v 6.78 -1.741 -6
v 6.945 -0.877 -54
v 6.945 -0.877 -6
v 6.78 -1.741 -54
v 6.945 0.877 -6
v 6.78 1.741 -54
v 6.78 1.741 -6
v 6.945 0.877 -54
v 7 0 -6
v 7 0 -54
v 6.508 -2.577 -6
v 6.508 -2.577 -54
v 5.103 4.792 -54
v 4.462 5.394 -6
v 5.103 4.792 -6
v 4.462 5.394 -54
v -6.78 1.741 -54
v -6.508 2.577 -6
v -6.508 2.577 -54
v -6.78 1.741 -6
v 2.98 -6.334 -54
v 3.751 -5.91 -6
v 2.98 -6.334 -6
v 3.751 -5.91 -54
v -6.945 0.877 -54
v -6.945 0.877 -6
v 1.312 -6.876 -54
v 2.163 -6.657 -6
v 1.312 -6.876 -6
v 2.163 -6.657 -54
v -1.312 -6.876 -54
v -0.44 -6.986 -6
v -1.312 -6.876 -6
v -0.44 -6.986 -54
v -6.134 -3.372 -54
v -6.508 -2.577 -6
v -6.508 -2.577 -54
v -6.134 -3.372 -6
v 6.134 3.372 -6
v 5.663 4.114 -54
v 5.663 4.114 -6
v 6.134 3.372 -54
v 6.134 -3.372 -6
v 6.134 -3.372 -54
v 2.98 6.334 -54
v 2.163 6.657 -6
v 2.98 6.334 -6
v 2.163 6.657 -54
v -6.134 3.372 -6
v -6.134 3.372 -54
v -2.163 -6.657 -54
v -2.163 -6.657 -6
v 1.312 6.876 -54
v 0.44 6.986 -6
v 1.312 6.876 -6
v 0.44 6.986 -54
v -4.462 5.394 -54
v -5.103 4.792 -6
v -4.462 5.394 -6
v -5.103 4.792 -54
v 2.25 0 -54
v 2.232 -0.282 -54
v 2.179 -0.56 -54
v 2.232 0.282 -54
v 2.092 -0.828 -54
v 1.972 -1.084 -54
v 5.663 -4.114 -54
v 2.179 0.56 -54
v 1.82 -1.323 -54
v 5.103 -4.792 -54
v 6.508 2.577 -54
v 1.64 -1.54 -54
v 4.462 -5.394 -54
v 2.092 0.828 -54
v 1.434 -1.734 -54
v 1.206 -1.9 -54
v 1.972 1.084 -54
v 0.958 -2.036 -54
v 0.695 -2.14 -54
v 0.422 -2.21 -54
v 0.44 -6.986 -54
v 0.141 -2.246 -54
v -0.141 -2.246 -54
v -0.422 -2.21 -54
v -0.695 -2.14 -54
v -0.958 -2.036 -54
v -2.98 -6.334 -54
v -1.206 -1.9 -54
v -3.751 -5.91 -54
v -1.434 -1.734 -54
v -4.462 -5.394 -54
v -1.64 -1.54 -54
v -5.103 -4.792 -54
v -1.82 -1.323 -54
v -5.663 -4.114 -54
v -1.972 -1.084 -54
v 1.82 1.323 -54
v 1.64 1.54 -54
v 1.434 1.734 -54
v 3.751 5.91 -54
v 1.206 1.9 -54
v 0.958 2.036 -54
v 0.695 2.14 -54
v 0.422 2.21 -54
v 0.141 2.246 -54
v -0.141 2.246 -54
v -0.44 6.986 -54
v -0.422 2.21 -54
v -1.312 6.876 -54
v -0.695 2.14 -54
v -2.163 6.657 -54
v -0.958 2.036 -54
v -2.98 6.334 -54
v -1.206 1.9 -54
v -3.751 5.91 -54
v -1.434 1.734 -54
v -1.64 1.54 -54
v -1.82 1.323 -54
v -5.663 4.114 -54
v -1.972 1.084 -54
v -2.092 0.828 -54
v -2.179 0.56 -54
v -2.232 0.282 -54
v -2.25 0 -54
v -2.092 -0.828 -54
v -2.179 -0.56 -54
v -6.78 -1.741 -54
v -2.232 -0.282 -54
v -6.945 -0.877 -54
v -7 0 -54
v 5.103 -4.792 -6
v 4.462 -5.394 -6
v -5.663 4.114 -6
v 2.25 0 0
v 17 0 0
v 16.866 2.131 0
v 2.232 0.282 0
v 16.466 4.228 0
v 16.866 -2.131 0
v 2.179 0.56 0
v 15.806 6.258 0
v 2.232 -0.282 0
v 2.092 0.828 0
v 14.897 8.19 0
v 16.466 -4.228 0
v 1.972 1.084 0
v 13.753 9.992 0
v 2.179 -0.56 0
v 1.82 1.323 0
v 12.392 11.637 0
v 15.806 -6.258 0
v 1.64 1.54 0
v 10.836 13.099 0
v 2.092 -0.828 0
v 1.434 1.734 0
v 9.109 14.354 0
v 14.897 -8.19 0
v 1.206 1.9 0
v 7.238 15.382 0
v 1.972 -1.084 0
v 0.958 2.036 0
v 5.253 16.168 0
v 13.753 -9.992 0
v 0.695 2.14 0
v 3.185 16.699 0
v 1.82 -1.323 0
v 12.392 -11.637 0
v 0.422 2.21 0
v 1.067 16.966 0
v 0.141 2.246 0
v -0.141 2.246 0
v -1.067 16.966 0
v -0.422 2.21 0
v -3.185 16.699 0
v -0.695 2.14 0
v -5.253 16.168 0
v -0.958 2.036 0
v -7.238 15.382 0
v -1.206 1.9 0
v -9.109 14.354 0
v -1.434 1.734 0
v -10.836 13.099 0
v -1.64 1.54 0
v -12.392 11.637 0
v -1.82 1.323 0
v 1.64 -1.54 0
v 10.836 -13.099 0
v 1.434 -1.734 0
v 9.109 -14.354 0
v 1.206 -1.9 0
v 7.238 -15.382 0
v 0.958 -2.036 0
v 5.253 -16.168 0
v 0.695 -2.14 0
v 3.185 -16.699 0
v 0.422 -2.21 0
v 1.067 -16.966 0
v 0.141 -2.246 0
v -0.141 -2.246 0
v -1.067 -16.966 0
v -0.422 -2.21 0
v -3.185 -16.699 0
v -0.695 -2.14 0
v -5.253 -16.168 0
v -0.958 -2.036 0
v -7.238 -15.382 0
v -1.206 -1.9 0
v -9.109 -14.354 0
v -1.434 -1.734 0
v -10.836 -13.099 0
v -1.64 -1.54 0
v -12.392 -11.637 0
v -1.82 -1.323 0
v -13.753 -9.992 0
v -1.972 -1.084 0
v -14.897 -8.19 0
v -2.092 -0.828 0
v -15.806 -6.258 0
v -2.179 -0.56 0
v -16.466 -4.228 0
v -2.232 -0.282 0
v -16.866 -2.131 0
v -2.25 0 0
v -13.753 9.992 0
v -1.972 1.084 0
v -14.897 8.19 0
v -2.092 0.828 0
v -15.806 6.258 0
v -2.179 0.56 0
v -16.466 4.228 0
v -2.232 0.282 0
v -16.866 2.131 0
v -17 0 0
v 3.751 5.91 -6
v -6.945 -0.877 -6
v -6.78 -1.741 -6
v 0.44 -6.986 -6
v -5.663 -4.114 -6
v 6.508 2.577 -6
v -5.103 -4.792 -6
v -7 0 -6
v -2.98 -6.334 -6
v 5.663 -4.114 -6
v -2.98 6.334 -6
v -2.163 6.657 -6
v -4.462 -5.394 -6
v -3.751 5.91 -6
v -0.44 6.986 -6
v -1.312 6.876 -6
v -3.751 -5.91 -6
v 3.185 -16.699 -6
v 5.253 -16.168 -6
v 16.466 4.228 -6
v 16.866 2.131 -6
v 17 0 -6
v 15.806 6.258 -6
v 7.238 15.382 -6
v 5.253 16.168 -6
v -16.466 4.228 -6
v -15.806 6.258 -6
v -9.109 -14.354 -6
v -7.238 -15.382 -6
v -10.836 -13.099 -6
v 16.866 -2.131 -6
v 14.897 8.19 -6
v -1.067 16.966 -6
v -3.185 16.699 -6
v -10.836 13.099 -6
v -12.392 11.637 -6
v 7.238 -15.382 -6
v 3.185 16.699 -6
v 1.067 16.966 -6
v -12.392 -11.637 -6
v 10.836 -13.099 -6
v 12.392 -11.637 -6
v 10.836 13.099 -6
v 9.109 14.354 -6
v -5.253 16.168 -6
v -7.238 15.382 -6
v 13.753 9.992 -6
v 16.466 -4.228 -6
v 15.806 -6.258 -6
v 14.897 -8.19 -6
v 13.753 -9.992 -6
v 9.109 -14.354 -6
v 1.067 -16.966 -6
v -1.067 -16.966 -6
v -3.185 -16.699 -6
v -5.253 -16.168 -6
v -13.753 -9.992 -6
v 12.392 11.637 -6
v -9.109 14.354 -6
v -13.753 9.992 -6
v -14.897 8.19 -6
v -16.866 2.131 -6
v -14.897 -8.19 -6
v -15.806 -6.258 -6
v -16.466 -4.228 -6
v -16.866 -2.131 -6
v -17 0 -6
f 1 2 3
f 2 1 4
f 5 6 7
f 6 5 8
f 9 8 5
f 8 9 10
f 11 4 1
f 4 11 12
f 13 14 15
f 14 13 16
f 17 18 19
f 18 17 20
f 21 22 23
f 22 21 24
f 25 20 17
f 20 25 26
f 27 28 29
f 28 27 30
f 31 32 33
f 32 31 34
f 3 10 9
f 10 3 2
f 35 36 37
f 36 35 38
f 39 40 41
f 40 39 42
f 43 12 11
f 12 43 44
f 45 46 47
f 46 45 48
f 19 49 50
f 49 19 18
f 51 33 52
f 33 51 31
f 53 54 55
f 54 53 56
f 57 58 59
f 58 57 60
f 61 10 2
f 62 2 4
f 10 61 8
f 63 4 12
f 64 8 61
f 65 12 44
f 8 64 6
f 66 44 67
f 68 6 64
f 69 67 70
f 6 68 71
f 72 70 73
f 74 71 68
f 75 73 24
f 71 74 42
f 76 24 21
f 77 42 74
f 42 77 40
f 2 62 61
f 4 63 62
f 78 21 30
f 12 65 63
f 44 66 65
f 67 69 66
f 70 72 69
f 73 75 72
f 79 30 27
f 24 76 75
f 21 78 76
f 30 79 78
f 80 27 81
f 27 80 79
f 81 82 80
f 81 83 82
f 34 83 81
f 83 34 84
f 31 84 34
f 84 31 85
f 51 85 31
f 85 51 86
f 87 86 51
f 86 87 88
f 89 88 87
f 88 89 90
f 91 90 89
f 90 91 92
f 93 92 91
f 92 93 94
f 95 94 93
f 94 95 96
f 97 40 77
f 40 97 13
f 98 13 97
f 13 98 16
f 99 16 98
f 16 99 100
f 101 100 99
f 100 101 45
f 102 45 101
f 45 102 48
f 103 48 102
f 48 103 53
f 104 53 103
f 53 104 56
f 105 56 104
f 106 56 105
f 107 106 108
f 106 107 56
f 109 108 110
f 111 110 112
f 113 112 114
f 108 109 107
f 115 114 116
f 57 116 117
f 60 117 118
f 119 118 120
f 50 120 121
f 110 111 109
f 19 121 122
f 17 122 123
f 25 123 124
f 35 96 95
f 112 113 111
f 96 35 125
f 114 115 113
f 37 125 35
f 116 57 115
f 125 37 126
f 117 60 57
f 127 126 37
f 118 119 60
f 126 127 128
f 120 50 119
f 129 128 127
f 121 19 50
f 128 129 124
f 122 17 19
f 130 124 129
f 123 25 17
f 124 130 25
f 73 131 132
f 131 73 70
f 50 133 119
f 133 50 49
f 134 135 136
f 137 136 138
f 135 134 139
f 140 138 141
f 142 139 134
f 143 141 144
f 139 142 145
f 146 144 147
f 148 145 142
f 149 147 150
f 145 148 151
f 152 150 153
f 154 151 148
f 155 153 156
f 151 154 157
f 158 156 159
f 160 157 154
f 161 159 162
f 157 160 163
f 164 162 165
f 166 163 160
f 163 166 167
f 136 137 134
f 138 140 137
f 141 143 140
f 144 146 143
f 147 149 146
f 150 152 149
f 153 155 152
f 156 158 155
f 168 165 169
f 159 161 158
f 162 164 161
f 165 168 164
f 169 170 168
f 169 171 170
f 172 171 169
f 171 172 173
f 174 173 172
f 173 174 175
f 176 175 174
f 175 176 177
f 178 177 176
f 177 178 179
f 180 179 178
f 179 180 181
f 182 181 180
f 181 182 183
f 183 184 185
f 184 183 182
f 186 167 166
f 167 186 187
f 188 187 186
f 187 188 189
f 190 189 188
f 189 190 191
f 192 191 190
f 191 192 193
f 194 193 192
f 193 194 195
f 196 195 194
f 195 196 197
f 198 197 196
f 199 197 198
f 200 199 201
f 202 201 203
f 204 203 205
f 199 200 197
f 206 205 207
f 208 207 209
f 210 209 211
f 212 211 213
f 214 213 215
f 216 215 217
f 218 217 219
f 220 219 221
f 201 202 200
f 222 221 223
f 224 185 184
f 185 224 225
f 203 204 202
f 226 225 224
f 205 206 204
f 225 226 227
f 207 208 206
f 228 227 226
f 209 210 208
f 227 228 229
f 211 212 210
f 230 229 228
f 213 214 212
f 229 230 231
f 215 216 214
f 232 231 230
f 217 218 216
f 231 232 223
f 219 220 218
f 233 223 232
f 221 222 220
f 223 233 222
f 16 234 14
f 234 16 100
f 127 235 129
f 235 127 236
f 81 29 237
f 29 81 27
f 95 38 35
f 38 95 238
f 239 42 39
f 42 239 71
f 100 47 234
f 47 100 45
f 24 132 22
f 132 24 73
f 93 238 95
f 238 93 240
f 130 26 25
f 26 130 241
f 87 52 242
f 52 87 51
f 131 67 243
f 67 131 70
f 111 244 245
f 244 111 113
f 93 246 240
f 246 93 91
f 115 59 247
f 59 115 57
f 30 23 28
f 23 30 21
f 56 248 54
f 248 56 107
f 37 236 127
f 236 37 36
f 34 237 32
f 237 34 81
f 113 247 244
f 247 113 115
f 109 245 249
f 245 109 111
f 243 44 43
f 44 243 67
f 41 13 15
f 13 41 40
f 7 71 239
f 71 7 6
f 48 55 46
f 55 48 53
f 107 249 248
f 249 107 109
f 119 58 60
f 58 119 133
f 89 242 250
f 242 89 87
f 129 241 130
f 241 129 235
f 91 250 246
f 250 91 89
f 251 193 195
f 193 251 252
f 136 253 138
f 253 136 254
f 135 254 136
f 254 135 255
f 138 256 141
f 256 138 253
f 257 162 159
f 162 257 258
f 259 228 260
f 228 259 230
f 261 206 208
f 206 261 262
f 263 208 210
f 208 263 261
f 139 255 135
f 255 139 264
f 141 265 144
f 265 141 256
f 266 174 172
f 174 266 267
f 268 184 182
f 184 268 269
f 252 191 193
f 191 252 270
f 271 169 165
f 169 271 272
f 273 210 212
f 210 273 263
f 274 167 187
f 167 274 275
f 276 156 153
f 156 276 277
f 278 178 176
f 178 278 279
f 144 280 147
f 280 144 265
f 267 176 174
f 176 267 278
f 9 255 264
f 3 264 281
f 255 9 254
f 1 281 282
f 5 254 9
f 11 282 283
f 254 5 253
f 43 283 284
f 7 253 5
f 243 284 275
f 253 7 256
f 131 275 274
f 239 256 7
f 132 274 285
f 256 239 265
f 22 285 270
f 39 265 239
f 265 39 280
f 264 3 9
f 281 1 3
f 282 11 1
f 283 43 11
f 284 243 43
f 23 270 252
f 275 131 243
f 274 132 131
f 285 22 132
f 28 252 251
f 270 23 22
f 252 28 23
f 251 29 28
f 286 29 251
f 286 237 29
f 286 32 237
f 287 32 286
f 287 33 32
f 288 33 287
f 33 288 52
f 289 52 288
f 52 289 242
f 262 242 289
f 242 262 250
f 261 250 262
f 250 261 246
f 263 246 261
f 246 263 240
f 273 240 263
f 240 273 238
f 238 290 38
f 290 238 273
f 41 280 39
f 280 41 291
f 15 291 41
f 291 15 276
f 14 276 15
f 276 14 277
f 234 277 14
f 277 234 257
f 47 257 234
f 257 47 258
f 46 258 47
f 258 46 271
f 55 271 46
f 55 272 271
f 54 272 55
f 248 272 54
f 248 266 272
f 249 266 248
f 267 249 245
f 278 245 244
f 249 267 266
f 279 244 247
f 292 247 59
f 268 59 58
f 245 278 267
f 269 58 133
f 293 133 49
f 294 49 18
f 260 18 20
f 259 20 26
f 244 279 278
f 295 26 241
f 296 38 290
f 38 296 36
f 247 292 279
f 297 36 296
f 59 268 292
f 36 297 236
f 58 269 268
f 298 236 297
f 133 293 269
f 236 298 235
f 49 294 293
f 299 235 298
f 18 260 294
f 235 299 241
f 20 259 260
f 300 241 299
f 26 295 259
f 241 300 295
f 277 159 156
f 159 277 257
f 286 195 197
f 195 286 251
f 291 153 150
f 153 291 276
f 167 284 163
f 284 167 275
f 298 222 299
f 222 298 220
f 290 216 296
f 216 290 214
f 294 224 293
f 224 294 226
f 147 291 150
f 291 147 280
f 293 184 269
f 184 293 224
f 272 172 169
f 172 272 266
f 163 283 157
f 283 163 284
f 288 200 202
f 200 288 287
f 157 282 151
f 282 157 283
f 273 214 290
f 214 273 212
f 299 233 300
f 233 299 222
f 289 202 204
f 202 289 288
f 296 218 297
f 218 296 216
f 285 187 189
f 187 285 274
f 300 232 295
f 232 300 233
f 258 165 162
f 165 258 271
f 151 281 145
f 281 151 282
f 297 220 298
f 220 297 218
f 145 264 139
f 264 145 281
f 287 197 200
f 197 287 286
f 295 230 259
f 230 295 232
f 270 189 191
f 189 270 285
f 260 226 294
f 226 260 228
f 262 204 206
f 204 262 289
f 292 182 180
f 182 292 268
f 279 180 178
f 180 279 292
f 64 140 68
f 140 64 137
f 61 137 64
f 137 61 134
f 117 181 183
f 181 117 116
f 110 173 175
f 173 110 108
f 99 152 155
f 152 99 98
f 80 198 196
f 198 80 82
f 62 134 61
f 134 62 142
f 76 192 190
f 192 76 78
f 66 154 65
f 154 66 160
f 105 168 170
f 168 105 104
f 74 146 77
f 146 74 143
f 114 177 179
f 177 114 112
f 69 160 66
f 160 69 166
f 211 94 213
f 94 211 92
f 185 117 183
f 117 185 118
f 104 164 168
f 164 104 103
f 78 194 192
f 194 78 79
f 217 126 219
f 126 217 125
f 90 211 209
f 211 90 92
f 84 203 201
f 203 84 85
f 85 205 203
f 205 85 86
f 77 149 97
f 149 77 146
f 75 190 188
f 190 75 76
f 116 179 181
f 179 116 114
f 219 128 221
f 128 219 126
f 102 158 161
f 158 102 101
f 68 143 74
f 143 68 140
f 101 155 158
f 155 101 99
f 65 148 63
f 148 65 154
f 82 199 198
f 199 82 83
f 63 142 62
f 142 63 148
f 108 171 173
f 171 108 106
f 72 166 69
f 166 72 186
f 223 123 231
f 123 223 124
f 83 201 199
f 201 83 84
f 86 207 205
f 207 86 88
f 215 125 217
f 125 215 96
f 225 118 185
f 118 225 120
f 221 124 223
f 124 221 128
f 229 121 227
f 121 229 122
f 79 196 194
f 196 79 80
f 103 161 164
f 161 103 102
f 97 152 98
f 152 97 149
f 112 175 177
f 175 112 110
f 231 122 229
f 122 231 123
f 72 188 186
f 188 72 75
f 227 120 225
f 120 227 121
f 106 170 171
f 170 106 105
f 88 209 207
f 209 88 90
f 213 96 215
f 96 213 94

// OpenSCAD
$fn = 50;


difference() {
	union() {
		translate(v = [0, 0, -54.0000000000]) {
			cylinder(h = 54, r = 7.0000000000);
		}
		translate(v = [0, 0, -6.0000000000]) {
			cylinder(h = 6, r = 17.0000000000);
		}
	}
	union() {
		#translate(v = [0, 0, -54]) {
			cylinder(h = 54, r = 2.2500000000);
		}
	}
}
